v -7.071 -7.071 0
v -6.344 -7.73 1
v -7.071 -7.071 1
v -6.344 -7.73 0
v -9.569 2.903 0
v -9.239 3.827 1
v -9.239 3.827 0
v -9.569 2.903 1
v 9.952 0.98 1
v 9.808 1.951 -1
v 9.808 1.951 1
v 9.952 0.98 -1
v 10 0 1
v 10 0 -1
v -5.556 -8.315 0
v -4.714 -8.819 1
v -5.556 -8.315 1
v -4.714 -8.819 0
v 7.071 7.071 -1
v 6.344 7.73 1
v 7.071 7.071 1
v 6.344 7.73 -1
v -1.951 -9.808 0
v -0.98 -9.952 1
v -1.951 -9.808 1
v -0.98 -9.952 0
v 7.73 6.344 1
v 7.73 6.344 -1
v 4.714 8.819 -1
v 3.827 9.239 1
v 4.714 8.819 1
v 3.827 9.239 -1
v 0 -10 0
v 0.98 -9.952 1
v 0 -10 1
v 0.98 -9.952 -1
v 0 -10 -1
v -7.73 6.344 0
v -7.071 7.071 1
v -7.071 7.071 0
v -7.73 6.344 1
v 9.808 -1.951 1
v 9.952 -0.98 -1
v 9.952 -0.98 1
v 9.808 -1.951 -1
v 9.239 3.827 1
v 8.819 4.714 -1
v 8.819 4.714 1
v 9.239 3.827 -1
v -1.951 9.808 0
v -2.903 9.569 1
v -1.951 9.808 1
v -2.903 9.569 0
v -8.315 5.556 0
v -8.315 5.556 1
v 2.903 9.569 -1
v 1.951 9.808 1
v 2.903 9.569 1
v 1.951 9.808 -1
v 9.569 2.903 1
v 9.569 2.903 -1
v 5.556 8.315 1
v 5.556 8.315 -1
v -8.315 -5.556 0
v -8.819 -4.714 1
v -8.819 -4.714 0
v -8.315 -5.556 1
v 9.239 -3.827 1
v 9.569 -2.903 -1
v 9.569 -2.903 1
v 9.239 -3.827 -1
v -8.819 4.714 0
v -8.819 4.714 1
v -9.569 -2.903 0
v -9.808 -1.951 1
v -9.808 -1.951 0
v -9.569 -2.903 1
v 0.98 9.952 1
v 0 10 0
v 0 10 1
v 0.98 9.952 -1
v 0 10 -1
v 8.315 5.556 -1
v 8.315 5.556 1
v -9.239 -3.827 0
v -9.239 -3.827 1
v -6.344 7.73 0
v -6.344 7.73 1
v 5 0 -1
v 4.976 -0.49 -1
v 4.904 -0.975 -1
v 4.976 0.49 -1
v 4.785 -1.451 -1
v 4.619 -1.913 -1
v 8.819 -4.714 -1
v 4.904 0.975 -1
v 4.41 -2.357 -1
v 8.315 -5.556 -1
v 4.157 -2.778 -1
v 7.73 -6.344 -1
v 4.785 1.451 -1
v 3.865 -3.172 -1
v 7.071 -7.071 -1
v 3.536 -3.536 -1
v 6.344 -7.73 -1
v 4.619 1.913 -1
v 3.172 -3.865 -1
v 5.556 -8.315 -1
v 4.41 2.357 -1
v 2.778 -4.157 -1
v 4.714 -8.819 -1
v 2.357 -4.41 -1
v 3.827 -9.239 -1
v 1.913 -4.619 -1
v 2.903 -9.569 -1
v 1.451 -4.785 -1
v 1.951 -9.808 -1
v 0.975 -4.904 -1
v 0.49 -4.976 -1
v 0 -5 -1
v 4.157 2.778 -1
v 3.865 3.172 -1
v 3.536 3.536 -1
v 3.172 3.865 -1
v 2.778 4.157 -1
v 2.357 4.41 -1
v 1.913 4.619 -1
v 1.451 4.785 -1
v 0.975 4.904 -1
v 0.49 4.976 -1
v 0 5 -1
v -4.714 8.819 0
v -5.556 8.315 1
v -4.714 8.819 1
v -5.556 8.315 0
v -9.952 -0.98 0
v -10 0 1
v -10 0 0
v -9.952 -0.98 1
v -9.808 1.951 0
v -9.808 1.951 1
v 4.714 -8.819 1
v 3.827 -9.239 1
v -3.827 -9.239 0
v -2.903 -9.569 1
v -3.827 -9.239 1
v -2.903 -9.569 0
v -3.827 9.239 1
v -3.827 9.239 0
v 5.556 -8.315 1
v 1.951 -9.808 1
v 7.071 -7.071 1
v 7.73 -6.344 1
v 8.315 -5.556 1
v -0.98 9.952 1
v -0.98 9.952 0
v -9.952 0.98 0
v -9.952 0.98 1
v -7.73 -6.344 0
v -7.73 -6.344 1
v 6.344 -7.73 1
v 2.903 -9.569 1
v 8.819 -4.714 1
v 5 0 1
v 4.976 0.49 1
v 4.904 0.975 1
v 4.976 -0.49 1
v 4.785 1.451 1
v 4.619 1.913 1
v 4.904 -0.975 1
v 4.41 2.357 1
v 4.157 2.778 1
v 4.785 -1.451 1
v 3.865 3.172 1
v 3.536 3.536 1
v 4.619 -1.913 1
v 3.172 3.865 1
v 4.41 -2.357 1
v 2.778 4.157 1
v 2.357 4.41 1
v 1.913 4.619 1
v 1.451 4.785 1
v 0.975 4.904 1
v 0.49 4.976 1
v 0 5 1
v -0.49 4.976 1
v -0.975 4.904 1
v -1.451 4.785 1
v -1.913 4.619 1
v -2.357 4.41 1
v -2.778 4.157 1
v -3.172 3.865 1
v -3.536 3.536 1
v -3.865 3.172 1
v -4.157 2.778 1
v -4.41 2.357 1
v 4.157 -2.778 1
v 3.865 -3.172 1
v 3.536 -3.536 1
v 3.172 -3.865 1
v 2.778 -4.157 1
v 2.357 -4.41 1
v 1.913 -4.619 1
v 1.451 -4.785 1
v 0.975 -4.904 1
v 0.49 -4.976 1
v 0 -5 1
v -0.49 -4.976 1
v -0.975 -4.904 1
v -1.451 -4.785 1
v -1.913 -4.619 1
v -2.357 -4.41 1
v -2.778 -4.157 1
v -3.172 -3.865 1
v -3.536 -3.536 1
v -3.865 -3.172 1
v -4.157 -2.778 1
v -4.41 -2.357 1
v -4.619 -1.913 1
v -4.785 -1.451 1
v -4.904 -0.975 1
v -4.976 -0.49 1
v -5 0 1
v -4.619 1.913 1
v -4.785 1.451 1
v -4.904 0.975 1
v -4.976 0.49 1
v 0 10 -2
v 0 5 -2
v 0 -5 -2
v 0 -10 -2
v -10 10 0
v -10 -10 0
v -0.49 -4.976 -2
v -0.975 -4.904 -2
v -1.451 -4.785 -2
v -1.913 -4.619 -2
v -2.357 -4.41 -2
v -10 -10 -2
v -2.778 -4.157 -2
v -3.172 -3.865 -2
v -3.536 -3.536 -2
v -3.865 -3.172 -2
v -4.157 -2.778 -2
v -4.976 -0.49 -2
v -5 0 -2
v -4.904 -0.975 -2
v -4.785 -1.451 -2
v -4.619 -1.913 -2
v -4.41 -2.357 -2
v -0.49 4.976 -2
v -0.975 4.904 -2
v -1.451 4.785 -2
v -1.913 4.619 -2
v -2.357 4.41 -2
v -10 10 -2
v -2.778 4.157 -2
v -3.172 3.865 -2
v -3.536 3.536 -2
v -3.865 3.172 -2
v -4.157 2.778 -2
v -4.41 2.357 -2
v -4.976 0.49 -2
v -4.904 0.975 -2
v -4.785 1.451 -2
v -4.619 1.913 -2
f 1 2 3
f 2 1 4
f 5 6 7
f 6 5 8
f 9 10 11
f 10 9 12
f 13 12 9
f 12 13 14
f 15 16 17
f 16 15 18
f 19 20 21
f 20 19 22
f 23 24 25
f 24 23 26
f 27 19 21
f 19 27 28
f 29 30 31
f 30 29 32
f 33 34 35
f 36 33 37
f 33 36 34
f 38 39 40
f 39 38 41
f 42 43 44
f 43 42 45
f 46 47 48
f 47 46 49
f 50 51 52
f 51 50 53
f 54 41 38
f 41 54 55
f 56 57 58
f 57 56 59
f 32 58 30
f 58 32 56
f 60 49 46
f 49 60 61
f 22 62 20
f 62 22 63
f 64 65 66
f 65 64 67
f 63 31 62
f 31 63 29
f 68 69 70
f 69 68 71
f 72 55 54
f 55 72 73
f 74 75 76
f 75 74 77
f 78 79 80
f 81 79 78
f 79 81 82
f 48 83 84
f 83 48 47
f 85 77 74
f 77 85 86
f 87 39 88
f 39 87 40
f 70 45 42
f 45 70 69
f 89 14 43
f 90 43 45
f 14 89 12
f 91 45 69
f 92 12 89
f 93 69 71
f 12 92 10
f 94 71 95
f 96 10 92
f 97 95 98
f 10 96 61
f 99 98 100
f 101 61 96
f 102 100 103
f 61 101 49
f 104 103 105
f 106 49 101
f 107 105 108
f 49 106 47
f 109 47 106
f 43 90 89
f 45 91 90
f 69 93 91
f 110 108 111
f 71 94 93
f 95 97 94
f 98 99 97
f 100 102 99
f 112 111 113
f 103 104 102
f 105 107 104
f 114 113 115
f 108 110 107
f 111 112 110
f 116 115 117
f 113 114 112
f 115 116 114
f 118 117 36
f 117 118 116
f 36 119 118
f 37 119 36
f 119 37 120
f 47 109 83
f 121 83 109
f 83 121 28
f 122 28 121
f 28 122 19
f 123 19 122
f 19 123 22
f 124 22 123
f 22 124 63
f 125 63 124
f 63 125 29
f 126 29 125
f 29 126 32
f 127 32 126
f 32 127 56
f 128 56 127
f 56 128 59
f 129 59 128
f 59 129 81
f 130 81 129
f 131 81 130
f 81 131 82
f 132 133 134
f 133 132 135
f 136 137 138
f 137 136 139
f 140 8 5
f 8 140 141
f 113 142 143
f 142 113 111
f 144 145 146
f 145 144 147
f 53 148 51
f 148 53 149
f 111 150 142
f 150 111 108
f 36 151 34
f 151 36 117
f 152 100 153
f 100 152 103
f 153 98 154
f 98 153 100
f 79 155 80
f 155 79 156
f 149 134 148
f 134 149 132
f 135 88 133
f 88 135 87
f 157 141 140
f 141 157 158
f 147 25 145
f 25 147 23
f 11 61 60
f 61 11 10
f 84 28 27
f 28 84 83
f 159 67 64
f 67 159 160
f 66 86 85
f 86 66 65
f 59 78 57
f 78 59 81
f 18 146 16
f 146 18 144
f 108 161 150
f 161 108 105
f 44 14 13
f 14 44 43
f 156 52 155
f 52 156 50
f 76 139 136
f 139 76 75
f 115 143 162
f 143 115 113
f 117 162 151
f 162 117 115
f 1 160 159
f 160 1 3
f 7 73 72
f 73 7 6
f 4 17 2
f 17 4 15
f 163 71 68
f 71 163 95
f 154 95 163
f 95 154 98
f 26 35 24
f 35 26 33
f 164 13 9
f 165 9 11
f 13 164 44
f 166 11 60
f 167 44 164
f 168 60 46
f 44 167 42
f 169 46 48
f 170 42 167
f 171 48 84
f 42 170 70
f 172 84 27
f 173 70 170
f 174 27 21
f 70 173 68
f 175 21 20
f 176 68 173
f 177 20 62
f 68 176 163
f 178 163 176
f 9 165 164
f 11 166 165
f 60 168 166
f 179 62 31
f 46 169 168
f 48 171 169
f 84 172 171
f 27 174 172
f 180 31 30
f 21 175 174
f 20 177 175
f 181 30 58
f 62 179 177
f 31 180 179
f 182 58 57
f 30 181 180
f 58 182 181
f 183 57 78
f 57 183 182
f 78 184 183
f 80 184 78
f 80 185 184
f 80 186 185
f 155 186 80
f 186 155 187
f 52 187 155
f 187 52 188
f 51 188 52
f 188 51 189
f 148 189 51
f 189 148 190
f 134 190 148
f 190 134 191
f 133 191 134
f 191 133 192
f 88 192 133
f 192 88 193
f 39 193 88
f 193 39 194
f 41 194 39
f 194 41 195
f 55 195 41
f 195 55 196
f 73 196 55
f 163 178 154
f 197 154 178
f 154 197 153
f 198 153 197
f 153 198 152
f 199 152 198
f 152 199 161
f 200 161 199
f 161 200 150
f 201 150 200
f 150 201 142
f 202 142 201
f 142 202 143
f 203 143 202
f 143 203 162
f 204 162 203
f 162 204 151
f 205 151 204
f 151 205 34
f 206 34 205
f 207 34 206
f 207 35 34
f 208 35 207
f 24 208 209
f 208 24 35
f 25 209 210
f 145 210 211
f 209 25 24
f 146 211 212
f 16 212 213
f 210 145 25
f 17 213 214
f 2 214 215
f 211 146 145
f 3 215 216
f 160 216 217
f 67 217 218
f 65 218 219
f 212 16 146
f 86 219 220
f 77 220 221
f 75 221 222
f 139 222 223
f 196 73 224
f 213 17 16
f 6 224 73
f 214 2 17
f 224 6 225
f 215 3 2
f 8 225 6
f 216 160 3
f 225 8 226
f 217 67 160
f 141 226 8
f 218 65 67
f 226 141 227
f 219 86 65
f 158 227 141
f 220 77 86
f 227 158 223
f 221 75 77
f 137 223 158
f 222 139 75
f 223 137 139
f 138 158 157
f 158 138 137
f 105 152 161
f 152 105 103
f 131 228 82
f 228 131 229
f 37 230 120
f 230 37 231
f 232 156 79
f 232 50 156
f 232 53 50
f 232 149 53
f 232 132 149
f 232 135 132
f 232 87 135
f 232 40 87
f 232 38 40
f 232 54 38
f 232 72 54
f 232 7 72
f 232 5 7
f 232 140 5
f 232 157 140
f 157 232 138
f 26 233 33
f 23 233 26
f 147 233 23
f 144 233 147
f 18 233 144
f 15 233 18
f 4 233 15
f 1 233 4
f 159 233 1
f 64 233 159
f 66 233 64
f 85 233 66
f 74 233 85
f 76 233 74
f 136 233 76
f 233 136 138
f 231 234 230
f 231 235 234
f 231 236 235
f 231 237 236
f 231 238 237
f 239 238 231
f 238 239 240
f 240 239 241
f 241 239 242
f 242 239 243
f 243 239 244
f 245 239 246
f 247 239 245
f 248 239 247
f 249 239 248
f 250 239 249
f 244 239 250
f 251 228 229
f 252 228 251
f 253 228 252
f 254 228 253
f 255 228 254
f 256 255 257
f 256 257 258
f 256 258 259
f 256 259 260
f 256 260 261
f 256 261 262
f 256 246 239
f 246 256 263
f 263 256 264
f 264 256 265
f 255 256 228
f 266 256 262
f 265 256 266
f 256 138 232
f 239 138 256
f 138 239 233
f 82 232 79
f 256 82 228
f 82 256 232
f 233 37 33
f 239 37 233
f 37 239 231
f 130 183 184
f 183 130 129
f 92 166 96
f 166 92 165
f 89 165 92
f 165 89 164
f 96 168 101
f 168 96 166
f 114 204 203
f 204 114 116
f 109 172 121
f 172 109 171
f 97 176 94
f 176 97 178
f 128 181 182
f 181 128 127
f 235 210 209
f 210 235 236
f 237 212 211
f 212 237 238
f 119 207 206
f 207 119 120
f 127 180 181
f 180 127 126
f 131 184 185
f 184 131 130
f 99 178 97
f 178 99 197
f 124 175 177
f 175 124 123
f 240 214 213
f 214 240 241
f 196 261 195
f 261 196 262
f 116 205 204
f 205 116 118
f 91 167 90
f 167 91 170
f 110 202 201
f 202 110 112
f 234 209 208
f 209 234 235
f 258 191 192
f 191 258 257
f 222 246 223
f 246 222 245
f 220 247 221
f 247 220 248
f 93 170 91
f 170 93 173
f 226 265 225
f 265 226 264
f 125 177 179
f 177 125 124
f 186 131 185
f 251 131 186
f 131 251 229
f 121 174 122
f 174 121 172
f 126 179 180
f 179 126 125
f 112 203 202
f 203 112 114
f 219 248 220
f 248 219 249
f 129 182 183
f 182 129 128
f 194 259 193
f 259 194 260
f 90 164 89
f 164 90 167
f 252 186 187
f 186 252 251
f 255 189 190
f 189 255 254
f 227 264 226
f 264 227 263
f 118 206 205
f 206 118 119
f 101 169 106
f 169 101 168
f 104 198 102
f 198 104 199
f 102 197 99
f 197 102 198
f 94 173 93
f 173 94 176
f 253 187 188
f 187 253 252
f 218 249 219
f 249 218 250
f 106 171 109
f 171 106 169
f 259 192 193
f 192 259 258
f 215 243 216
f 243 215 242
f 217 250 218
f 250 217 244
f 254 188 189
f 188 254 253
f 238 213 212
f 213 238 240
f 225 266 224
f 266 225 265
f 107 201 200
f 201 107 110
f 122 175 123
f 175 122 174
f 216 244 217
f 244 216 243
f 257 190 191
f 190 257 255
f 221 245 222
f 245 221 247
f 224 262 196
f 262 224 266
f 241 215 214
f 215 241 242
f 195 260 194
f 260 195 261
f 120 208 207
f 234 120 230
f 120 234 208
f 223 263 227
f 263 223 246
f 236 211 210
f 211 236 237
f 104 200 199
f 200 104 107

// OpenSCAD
module ring_terminal() {
    difference() {
        union() {
            // Main body of the terminal
            translate([0, 0, -1])
                cylinder(h=2, r=10, $fn=64);
            // Connector part of the terminal
            translate([-5, 0, -1])
                cube([10, 20, 2], center=true);
        }
        // Hole in the ring
        translate([0, 0, -2])
            cylinder(h=4, r=5, $fn=64);
    }
}

ring_terminal();
